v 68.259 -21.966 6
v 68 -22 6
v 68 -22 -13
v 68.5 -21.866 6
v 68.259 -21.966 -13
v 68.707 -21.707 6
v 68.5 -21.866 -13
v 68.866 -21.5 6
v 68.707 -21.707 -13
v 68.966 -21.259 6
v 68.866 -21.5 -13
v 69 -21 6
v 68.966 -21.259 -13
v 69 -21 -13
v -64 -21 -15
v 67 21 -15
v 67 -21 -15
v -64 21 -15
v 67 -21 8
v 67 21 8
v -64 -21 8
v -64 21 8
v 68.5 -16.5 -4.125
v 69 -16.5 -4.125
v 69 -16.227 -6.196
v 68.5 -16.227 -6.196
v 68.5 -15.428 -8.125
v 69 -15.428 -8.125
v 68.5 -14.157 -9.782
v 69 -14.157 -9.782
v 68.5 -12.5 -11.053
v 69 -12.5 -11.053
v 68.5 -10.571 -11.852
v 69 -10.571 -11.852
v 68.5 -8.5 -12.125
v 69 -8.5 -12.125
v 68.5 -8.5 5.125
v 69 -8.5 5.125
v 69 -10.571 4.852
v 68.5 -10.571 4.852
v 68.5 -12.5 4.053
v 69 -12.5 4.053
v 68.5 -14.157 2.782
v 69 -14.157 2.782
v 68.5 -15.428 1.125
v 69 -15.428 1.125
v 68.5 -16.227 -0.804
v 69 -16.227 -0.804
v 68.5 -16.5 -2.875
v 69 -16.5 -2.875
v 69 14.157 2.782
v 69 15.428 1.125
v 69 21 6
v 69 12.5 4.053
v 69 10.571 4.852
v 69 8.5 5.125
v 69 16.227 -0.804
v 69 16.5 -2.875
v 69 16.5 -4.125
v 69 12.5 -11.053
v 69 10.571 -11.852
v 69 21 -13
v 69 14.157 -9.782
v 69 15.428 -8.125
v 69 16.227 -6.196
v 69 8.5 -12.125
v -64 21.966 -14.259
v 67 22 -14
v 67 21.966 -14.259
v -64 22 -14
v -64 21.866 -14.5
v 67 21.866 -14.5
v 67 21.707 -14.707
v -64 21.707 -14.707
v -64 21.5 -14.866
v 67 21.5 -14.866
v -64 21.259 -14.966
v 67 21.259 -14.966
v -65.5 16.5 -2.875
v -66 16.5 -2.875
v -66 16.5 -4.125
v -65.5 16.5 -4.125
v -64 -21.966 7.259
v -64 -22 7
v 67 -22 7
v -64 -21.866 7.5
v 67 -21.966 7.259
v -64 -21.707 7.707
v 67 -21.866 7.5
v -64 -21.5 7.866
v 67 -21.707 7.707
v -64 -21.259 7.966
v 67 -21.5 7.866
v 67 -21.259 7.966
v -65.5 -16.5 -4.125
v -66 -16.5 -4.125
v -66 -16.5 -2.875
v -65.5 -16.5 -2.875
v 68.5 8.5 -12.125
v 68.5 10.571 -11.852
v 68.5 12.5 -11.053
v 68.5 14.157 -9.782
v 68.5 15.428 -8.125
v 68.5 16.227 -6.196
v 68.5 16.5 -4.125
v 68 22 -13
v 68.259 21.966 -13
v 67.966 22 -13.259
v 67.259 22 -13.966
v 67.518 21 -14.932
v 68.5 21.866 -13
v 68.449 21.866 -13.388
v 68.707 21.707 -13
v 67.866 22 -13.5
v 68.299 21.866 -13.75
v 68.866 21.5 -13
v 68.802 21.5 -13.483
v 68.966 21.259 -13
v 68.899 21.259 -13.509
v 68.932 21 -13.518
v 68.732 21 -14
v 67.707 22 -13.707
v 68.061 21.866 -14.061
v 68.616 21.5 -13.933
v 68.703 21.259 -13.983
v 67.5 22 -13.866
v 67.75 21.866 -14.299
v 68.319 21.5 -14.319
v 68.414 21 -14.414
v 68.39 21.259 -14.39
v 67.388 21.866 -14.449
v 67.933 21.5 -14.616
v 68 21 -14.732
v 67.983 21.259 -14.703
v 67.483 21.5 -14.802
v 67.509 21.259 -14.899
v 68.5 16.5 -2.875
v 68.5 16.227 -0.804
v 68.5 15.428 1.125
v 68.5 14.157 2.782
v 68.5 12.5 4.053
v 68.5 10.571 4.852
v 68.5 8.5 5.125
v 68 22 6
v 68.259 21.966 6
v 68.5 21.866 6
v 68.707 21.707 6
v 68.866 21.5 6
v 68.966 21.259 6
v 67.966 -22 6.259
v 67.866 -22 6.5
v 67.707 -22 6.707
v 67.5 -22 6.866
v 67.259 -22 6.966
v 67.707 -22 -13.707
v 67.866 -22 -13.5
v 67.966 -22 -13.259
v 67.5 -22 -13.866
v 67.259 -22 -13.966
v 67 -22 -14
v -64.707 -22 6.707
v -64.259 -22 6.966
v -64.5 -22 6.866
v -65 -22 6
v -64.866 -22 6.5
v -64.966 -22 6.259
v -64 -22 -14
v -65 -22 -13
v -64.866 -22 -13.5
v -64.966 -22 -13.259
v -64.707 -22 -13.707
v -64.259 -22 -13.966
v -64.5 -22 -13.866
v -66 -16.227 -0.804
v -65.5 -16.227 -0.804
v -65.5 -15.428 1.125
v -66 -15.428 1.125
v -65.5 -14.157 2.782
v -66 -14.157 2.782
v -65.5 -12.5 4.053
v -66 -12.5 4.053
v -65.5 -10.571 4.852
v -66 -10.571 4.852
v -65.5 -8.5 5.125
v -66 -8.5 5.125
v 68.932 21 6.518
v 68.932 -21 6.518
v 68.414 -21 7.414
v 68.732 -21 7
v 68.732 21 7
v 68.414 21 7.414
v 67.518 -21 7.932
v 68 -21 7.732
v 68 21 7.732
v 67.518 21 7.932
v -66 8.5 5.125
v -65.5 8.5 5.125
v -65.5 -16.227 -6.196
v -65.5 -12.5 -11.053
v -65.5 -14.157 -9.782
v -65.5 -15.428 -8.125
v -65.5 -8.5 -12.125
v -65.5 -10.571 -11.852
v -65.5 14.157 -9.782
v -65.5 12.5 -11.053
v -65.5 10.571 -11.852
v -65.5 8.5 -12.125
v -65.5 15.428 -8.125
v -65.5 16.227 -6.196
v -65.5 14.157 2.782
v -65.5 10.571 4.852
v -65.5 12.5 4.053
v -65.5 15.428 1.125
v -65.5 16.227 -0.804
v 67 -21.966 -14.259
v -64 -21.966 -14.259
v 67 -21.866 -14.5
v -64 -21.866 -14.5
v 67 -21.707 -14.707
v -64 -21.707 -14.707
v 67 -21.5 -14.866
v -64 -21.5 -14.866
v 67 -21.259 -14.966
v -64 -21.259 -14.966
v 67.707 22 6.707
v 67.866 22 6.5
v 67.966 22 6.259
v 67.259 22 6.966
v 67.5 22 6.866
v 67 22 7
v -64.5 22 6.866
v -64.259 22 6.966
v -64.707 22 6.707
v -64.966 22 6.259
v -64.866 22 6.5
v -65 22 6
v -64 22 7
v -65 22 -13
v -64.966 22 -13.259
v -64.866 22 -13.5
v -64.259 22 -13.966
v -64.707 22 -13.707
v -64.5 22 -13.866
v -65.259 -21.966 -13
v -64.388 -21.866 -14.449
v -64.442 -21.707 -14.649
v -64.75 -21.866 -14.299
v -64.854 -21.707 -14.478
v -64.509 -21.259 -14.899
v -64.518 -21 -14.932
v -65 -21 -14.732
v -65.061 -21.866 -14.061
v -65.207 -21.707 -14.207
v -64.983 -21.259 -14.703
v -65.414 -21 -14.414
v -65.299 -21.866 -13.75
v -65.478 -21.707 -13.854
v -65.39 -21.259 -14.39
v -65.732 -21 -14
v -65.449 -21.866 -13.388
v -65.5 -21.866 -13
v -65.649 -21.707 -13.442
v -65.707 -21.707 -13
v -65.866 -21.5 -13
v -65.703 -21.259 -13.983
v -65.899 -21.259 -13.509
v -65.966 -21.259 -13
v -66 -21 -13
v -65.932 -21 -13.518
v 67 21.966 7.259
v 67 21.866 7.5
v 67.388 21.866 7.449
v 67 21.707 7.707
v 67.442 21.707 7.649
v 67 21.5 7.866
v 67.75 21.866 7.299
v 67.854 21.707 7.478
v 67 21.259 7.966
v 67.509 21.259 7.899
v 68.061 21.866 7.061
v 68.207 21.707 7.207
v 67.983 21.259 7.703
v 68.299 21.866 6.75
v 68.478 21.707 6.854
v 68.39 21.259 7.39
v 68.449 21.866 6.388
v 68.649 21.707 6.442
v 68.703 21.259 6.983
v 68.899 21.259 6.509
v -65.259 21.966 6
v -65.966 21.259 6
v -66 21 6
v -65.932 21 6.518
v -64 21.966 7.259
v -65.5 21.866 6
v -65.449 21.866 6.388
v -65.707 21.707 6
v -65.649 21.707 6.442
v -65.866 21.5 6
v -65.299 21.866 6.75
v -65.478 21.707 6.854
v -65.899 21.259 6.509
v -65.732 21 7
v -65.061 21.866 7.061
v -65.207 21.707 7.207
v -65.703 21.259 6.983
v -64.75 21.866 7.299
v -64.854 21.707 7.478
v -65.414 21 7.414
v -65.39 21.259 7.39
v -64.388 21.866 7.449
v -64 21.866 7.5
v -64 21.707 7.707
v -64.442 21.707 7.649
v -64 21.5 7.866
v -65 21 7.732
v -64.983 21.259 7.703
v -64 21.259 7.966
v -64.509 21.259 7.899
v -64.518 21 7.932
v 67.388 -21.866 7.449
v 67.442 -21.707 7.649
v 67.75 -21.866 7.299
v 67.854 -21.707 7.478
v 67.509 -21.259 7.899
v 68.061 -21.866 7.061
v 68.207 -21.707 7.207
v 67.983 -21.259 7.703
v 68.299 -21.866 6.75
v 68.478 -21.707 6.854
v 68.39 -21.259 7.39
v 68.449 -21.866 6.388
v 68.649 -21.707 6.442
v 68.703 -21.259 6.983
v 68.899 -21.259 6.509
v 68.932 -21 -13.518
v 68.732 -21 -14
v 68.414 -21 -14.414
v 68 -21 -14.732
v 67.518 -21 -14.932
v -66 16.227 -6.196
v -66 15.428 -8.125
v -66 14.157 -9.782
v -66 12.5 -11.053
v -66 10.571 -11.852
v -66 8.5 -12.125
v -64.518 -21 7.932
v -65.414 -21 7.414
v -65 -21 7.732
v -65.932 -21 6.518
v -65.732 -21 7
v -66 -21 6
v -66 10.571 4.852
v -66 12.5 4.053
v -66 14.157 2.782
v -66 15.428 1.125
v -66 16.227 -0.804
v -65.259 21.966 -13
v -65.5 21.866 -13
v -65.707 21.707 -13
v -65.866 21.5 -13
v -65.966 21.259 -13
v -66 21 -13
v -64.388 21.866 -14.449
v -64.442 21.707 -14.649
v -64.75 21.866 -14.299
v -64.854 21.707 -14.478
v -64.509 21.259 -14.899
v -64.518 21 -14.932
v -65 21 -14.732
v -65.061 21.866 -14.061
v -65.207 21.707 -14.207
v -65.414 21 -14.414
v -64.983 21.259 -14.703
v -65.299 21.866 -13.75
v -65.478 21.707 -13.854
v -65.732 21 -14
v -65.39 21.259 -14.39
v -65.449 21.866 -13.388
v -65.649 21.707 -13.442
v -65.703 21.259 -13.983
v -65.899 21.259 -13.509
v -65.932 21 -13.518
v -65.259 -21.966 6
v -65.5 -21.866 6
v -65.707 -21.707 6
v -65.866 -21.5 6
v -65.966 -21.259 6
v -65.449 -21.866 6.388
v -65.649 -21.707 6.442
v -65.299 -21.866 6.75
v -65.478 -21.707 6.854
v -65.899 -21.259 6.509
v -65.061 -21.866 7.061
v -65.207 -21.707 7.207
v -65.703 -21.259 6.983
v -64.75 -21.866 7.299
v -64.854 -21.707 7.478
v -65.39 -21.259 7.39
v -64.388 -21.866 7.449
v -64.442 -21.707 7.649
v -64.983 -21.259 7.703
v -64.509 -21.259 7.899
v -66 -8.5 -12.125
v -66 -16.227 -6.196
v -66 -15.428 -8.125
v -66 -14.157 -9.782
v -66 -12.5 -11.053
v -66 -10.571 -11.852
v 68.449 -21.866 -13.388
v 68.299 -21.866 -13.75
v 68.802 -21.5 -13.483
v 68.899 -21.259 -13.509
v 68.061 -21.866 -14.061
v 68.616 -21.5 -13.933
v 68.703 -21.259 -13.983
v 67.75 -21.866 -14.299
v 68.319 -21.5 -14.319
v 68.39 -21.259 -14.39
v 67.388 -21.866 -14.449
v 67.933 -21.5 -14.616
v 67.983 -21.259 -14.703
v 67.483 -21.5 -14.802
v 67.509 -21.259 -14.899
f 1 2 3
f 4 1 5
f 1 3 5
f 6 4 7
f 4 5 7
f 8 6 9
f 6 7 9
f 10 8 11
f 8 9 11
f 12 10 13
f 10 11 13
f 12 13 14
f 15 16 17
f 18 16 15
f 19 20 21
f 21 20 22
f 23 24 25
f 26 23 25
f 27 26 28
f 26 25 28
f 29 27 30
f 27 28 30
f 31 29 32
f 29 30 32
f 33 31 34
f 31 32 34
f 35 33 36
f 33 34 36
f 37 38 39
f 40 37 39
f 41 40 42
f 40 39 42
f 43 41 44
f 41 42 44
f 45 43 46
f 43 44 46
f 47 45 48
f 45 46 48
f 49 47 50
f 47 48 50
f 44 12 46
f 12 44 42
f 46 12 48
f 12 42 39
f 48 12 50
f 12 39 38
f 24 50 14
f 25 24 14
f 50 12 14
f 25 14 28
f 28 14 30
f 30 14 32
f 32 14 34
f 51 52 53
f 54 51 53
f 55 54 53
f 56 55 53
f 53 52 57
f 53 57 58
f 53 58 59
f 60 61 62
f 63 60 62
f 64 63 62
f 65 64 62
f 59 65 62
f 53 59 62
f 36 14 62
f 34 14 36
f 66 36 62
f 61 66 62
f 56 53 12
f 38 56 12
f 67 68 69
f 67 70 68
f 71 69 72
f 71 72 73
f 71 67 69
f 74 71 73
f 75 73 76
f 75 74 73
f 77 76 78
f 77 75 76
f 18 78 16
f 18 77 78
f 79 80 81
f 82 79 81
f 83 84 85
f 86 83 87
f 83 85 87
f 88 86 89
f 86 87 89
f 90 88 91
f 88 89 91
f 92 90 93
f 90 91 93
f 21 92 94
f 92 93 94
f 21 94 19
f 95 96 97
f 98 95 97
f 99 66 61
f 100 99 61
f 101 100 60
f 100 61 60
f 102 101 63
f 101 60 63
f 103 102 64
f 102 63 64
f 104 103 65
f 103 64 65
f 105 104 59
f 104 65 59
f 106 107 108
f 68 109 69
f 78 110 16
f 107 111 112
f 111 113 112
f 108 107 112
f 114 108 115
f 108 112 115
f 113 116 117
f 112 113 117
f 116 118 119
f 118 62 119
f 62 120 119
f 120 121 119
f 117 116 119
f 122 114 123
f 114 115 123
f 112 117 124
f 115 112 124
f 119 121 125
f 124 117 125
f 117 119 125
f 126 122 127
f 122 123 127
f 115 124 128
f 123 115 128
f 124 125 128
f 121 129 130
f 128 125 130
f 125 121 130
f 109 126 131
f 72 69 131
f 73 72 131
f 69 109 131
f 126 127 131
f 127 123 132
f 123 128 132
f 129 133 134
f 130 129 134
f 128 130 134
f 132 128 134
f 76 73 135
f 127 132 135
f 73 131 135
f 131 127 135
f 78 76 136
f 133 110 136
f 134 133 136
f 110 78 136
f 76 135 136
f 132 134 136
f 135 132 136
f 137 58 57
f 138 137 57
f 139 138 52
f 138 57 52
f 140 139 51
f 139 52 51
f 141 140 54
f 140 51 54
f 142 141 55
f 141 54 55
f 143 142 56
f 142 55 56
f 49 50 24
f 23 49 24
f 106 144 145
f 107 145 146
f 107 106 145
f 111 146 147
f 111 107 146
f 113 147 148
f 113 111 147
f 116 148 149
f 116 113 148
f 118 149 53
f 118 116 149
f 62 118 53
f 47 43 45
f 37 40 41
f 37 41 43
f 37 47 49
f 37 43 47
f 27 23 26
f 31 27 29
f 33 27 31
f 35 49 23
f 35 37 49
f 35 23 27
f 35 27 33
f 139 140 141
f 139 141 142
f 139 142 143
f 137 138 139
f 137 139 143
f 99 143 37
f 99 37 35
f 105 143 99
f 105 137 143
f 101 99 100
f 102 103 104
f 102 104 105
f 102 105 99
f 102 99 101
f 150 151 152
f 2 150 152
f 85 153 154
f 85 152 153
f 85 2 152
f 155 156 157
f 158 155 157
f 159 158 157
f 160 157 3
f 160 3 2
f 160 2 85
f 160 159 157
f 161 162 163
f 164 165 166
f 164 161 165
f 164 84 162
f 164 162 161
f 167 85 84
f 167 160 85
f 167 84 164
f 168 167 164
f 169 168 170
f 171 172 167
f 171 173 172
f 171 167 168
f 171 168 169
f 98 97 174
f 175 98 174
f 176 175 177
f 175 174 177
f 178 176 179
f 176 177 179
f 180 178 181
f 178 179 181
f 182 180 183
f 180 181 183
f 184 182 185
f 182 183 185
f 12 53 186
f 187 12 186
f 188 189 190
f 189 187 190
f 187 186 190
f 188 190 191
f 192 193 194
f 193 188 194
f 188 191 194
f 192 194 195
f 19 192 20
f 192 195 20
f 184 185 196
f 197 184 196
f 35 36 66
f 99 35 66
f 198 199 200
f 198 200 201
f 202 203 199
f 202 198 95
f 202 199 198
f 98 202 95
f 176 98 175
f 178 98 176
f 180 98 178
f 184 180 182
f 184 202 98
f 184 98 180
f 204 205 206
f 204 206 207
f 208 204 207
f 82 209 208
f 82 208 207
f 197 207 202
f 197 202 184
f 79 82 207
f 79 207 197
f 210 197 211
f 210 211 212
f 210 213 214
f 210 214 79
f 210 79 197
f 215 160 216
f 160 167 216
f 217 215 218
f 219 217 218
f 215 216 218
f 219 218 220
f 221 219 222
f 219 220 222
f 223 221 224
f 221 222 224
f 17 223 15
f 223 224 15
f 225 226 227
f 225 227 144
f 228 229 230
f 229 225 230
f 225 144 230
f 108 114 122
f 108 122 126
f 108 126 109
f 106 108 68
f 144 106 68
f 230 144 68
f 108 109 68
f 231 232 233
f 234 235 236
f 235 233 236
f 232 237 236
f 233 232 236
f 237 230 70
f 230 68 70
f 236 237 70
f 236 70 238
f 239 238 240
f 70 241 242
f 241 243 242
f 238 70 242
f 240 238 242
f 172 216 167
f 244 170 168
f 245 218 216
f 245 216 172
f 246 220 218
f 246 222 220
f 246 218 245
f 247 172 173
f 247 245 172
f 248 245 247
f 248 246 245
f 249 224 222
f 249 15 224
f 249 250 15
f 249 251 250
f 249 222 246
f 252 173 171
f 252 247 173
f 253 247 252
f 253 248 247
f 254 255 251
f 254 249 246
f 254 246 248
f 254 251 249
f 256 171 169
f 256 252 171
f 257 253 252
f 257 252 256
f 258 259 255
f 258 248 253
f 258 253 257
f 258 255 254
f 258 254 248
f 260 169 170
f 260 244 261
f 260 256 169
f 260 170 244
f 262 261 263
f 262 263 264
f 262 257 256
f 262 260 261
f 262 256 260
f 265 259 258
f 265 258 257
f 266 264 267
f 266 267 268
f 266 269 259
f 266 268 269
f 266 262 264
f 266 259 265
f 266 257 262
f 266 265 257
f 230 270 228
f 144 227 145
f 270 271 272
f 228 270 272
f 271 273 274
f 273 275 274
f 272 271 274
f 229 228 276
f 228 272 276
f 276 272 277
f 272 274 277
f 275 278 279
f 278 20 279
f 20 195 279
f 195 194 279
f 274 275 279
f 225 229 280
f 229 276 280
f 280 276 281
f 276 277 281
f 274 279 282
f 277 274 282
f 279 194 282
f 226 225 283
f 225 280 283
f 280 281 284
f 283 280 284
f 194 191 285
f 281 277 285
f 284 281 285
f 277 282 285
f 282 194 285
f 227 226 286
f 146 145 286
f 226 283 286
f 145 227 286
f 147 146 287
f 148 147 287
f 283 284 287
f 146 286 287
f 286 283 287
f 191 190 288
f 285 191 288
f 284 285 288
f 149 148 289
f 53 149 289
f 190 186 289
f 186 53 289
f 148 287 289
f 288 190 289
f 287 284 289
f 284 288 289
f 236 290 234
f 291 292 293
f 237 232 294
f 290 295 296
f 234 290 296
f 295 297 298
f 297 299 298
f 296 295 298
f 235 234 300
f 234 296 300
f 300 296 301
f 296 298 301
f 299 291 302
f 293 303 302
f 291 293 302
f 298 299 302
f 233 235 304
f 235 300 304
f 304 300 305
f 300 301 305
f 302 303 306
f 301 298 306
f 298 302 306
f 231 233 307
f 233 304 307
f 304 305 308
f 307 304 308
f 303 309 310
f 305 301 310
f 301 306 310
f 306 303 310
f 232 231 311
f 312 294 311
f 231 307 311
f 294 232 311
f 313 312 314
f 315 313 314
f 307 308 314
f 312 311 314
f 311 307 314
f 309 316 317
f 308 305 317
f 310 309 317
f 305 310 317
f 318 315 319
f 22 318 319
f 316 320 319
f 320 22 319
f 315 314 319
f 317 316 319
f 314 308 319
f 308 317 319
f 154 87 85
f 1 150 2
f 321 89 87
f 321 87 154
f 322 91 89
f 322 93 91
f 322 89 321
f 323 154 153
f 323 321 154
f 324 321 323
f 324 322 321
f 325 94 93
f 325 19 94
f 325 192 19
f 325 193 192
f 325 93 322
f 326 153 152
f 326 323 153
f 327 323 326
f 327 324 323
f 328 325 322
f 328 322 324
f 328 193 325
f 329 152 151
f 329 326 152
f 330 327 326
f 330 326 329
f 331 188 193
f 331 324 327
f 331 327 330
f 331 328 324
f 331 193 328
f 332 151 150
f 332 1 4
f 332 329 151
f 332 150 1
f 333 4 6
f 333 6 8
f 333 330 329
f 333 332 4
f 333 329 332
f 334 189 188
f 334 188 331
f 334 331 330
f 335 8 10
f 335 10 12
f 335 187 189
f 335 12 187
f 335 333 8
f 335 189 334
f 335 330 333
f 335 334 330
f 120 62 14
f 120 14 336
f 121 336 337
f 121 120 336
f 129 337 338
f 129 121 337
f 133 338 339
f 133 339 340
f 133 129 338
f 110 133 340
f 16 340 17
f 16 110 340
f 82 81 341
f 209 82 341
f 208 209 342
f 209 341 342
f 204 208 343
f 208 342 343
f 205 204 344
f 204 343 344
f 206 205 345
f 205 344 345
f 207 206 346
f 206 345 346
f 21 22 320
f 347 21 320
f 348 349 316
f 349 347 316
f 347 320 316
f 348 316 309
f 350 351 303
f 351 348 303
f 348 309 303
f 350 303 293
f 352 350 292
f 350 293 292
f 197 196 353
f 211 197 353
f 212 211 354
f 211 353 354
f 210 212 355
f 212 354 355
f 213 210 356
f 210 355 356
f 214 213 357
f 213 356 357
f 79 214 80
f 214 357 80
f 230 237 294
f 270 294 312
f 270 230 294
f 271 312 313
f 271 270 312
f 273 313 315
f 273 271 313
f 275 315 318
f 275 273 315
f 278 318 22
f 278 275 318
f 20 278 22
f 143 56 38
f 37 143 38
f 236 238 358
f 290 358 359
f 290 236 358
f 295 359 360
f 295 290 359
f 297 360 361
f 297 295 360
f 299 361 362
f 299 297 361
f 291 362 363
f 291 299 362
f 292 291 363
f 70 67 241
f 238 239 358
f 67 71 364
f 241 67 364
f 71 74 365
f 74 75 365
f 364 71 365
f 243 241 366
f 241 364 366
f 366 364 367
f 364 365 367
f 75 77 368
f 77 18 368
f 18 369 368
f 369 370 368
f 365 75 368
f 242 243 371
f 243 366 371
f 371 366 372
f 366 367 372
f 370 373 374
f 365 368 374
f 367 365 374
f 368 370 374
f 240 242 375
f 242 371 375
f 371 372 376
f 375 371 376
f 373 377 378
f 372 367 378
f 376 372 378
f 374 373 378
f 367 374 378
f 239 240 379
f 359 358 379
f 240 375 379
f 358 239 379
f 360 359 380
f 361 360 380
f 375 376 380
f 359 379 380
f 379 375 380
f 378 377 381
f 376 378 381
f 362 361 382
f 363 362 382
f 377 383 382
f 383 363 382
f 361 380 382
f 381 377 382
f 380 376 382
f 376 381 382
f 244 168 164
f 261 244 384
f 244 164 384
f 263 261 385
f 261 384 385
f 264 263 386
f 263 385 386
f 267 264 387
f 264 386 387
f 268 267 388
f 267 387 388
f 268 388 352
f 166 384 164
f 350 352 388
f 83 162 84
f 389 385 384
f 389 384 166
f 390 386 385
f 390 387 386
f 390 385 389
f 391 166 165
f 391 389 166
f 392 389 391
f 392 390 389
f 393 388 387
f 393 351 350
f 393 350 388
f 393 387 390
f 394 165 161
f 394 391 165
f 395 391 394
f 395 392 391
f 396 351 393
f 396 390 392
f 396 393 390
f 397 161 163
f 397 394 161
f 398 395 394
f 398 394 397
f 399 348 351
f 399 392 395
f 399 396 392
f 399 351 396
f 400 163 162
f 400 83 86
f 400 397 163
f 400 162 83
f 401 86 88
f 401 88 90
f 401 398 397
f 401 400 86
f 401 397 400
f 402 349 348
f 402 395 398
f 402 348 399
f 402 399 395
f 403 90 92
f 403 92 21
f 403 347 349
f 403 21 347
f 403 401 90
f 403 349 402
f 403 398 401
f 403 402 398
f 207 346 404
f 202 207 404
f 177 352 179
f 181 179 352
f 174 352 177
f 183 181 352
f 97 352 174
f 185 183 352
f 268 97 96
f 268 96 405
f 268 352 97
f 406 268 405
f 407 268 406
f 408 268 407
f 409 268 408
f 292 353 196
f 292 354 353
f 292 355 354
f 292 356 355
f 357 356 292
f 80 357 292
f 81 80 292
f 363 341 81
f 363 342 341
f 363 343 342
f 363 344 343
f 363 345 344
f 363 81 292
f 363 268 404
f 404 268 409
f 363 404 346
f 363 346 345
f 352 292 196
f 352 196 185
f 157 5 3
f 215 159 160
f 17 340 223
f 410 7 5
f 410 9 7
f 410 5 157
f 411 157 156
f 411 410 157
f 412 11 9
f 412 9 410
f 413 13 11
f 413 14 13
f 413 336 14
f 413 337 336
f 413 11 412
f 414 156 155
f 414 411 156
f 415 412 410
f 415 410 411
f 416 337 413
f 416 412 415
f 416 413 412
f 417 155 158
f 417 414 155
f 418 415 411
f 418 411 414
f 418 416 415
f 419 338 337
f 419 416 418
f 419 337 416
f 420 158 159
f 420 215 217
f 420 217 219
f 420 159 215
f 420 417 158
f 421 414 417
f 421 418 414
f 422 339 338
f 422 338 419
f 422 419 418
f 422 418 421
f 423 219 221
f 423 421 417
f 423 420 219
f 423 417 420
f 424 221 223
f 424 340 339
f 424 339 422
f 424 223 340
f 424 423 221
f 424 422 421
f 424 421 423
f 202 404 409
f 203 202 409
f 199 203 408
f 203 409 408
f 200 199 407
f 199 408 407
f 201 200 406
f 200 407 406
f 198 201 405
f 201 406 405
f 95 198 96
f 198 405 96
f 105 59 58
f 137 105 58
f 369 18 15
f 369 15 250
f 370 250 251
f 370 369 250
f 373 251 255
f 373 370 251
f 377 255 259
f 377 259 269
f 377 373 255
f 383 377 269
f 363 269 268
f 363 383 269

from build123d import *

# Parameters (mm, degrees)
SKETCH1_W           = 135
SKETCH1_H           = 44
BOSS_EXTRUDE1_DEPTH = 23
CUT_EXTRUDE1_DEPTH  = 0.5
CUT_EXTRUDE2_DEPTH  = 0.5
FILLET1_R           = 2
FILLET2_R           = 1


with BuildPart() as part:
    # Sketch1 → Boss-Extrude1 (new body)
    with BuildSketch(Plane(origin=(0, 0, -15), x_dir=(-1, 0, 0), z_dir=(0, 0, -1))):
        with Locations((-1.5, 0)):
            Rectangle(SKETCH1_W, SKETCH1_H)
    extrude(amount=-BOSS_EXTRUDE1_DEPTH)

    # Sketch2 → Cut-Extrude1 (cut)
    with BuildSketch(Plane(origin=(69, 0, 0), x_dir=(0, 0, -1), z_dir=(1, 0, 0))):
        with BuildLine():
            Line((-5.125, 8.5), (-5.125, -8.5))
            ThreePointArc((-5.125, -8.5), (-2.781854249, -14.156854249), (2.875, -16.5))
            Line((2.875, -16.5), (4.125, -16.5))
            ThreePointArc((4.125, -16.5), (9.781854249, -14.156854249), (12.125, -8.5))
            Line((12.125, -8.5), (12.125, 8.5))
            ThreePointArc((12.125, 8.5), (9.781854249, 14.156854249), (4.125, 16.5))
            Line((4.125, 16.5), (2.875, 16.5))
            ThreePointArc((2.875, 16.5), (-2.781854249, 14.156854249), (-5.125, 8.5))
        make_face()
    extrude(amount=-CUT_EXTRUDE1_DEPTH, mode=Mode.SUBTRACT)

    # Sketch3 → Cut-Extrude2 (cut)
    with BuildSketch(Plane.ZY.offset(66)):
        with BuildLine():
            Line((-2.875, 16.5), (-4.125, 16.5))
            ThreePointArc((-4.125, 16.5), (-9.781854249, 14.156854249), (-12.125, 8.5))
            Line((-12.125, 8.5), (-12.125, -8.5))
            ThreePointArc((-12.125, -8.5), (-9.781854249, -14.156854249), (-4.125, -16.5))
            Line((-4.125, -16.5), (-2.875, -16.5))
            ThreePointArc((-2.875, -16.5), (2.781854249, -14.156854249), (5.125, -8.5))
            Line((5.125, -8.5), (5.125, 8.5))
            ThreePointArc((5.125, 8.5), (2.781854249, 14.156854249), (-2.875, 16.5))
        make_face()
    extrude(amount=-CUT_EXTRUDE2_DEPTH, mode=Mode.SUBTRACT)

    # Fillet1
    fillet1_edges = [part.edges().sort_by_distance(p)[0] for p in [
        (-66, 0, 8),
        (69, 0, 8),
        (-66, 0, -15),
        (69, 0, -15),
    ]]
    fillet(fillet1_edges, radius=FILLET1_R)

    # Fillet2
    fillet2_edges = [part.edges().sort_by_distance(p)[0] for p in [
        (1.5, -22, -15),
        (1.5, 22, -15),
        (-66, 22, -3.5),
        (1.5, 22, 8),
        (69, 22, -3.5),
        (68.414213562, 22, 7.414213562),
        (68.414213562, 22, -14.414213562),
        (-65.414213562, 22, 7.414213562),
        (-65.414213562, 22, -14.414213562),
        (-66, -22, -3.5),
        (69, -22, -3.5),
        (1.5, -22, 8),
        (68.414213562, -22, 7.414213562),
        (68.414213562, -22, -14.414213562),
        (-65.414213562, -22, 7.414213562),
        (-65.414213562, -22, -14.414213562),
    ]]
    fillet(fillet2_edges, radius=FILLET2_R)


solid = part.part
